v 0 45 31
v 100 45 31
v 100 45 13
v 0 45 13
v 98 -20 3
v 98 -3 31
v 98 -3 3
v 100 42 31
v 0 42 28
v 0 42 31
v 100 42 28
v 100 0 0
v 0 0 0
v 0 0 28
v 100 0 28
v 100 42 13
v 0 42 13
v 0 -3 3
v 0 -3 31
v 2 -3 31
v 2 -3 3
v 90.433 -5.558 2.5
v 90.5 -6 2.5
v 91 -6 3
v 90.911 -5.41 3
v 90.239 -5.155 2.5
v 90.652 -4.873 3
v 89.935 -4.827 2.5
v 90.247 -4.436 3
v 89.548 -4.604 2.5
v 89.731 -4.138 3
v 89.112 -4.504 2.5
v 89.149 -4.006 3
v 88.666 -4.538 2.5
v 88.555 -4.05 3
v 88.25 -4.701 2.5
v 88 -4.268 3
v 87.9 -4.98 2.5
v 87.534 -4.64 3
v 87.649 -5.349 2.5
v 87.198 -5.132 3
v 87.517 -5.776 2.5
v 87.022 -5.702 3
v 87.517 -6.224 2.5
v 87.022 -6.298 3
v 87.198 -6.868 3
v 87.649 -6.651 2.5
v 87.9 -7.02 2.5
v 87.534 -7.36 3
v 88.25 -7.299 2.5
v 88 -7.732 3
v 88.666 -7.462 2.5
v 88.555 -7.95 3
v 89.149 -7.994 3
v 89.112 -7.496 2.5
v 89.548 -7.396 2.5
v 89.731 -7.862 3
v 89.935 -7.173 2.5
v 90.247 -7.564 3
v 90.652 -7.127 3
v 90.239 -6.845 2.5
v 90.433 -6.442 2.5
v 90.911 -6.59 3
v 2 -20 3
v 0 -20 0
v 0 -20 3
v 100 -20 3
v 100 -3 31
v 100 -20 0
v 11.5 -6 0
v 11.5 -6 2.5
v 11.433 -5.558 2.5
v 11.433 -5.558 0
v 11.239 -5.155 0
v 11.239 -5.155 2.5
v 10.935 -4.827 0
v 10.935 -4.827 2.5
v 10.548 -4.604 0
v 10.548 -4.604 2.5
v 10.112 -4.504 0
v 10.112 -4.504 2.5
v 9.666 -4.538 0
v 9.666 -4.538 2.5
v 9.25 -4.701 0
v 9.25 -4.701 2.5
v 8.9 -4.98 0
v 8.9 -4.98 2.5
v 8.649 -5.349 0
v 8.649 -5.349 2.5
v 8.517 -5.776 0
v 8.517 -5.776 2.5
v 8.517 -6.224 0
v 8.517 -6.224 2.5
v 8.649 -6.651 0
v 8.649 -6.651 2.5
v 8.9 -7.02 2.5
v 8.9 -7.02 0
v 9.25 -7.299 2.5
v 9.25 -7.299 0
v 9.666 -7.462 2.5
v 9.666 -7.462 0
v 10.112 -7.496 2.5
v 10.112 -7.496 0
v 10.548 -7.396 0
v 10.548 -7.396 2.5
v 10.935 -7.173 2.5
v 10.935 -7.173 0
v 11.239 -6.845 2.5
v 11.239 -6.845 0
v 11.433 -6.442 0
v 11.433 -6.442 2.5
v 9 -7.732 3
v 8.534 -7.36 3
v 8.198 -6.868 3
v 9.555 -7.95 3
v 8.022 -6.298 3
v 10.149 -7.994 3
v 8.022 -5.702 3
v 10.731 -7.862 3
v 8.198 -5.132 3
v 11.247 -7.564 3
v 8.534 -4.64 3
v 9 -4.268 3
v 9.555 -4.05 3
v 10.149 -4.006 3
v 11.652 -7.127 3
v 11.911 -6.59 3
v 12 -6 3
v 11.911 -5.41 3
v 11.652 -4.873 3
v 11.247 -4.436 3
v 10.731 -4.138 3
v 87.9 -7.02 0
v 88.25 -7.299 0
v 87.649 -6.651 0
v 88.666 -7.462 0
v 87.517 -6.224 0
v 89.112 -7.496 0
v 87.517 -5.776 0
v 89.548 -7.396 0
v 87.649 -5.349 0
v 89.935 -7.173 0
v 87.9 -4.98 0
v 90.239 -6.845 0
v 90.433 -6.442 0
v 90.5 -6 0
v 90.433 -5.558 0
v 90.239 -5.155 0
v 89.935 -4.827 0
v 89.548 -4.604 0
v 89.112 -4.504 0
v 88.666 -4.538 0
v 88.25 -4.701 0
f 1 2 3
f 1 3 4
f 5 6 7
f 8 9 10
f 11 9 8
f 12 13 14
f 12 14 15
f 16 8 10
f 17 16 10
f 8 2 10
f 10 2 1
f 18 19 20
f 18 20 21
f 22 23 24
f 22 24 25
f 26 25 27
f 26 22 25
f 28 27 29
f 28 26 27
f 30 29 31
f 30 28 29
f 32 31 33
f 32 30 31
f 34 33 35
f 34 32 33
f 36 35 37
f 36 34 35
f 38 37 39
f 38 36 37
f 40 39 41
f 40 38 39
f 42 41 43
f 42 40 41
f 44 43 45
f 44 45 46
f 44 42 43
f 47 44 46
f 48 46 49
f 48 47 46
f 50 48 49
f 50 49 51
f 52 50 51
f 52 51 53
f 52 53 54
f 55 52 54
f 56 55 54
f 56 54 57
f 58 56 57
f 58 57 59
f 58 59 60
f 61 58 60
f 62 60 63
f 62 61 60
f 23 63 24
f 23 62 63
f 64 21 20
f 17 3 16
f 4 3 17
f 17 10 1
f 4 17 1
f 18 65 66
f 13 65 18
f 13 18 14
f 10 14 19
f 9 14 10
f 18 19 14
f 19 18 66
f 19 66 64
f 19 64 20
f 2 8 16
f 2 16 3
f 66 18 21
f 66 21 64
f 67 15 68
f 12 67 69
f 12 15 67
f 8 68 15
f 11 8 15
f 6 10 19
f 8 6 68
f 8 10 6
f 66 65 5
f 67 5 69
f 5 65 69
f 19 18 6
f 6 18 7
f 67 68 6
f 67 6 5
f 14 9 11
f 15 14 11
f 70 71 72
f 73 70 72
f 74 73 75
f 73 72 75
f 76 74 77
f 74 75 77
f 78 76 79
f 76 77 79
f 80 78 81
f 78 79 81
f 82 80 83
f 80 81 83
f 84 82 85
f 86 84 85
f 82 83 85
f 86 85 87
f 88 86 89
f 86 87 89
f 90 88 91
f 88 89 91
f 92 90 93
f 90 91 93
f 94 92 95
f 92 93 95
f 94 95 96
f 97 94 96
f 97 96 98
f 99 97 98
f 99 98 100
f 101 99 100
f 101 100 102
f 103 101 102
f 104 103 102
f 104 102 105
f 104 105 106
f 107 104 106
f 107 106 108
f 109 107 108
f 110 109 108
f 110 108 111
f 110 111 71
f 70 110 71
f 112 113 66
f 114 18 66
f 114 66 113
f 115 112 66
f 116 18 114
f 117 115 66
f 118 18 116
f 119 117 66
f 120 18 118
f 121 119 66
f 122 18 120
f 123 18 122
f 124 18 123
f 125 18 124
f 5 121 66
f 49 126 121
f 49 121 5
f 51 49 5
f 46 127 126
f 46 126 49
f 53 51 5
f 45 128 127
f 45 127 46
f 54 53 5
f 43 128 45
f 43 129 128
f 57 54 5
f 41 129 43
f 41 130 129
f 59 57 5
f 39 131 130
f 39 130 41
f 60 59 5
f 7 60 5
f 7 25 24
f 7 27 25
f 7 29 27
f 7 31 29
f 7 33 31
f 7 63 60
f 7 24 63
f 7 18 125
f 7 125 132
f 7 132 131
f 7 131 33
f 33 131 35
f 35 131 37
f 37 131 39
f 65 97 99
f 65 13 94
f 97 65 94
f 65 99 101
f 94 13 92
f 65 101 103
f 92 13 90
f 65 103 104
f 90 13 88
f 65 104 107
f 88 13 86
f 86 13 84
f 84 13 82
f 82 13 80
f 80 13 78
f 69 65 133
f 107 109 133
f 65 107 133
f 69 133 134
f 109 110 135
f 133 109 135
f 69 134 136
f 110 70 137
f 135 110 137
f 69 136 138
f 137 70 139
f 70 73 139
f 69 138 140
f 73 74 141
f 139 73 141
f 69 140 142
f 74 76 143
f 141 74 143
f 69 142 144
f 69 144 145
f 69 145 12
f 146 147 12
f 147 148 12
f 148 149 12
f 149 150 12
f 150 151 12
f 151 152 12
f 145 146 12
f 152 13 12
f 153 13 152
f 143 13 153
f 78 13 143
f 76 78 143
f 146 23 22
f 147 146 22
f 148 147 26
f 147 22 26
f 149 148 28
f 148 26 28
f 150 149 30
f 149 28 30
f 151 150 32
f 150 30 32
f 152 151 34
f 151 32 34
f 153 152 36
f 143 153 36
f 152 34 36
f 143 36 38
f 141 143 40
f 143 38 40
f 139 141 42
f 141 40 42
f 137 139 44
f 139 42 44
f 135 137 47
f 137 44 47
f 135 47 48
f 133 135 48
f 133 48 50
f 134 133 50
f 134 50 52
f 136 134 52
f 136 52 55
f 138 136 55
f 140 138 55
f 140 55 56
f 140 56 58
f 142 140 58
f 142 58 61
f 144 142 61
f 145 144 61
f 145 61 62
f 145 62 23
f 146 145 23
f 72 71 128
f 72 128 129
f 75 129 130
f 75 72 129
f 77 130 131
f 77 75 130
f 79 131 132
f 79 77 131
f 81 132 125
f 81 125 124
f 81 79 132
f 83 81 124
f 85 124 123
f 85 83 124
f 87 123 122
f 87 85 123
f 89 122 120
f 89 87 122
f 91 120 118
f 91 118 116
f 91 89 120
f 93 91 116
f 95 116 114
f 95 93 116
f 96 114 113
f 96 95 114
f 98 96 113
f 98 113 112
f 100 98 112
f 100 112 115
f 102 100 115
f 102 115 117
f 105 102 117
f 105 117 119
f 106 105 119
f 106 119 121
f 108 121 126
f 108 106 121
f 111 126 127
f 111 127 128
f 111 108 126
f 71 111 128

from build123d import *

# Parameters (mm, degrees)
SKETCH_1_W           = 100
SKETCH_1_H           = 20
EXTRUDE_1_DEPTH      = 3
SKETCH_2_W           = 100
SKETCH_2_H           = 3
EXTRUDE_2_DEPTH      = 25
SKETCH_3_W           = 100
SKETCH_3_H           = 45
EXTRUDE_3_DEPTH      = 3
EXTRUDE_4_DEPTH      = 15
EXTRUDE_4_DEPTH_BACK = 3
SKETCH_4_W           = 100
SKETCH_4_H           = 3
SKETCH_5_R           = 1.5
CUT_EXTRUDE_1_DEPTH  = 15
CHAMFER_1_SIZE       = 0.5
EXTRUDE_5_DEPTH      = 2
EXTRUDE_6_DEPTH      = 2


with BuildPart() as part:
    # 草图1 → 凸台-拉伸1 (new body)
    with BuildSketch(Plane.XY):
        with Locations((50, -10)):
            Rectangle(SKETCH_1_W, SKETCH_1_H)
    extrude(amount=EXTRUDE_1_DEPTH)

    # 草图2 → 凸台-拉伸2 (add)
    with BuildSketch(Plane.XY.offset(3)):
        with Locations((50, -1.5)):
            Rectangle(SKETCH_2_W, SKETCH_2_H)
    extrude(amount=EXTRUDE_2_DEPTH)

    # 草图3 → 凸台-拉伸3 (add)
    with BuildSketch(Plane.XY.offset(28)):
        with Locations((50, 19.5)):
            Rectangle(SKETCH_3_W, SKETCH_3_H)
    extrude(amount=EXTRUDE_3_DEPTH)

    # 草图5 → 切除-拉伸1 (cut)
    with BuildSketch(Plane.XY.offset(3)):
        with Locations((10, -6)):
            Circle(SKETCH_5_R)
        with Locations((89, -6)):
            Circle(SKETCH_5_R)
    extrude(amount=-CUT_EXTRUDE_1_DEPTH, mode=Mode.SUBTRACT)

    # 倒角1
    chamfer_1_edges = [part.edges().sort_by_distance(p)[0] for p in [
        (8.5, -6, 3),
        (87.5, -6, 3),
    ]]
    chamfer(chamfer_1_edges, length=CHAMFER_1_SIZE)

    # 草图7 → 凸台-拉伸6 (add)
    with BuildSketch(Plane(origin=(100, 0, 0), x_dir=(0, 0, -1), z_dir=(1, 0, 0))):
        Polygon((-3, -20), (-3, -3), (-31, -3), align=None)
    extrude(amount=-EXTRUDE_6_DEPTH)


with BuildPart() as body_2:
    # 草图4 → 凸台-拉伸4 (new, two sides: drawn at the far end of the back side and taken through both)
    with BuildSketch(Plane(origin=(0, 0, 28), x_dir=(-1, 0, 0), z_dir=(0, 0, -1)).offset(-EXTRUDE_4_DEPTH_BACK)):
        with Locations((-50, 43.5)):
            Rectangle(SKETCH_4_W, SKETCH_4_H)
    extrude(amount=EXTRUDE_4_DEPTH + EXTRUDE_4_DEPTH_BACK)


with BuildPart() as body_3:
    # 草图6 → 凸台-拉伸5 (new body)
    with BuildSketch(Plane.ZY):
        Polygon((3, -20), (31, -3), (3, -3), align=None)
    extrude(amount=-EXTRUDE_5_DEPTH)


solid = Compound([part.part, body_2.part, body_3.part])
